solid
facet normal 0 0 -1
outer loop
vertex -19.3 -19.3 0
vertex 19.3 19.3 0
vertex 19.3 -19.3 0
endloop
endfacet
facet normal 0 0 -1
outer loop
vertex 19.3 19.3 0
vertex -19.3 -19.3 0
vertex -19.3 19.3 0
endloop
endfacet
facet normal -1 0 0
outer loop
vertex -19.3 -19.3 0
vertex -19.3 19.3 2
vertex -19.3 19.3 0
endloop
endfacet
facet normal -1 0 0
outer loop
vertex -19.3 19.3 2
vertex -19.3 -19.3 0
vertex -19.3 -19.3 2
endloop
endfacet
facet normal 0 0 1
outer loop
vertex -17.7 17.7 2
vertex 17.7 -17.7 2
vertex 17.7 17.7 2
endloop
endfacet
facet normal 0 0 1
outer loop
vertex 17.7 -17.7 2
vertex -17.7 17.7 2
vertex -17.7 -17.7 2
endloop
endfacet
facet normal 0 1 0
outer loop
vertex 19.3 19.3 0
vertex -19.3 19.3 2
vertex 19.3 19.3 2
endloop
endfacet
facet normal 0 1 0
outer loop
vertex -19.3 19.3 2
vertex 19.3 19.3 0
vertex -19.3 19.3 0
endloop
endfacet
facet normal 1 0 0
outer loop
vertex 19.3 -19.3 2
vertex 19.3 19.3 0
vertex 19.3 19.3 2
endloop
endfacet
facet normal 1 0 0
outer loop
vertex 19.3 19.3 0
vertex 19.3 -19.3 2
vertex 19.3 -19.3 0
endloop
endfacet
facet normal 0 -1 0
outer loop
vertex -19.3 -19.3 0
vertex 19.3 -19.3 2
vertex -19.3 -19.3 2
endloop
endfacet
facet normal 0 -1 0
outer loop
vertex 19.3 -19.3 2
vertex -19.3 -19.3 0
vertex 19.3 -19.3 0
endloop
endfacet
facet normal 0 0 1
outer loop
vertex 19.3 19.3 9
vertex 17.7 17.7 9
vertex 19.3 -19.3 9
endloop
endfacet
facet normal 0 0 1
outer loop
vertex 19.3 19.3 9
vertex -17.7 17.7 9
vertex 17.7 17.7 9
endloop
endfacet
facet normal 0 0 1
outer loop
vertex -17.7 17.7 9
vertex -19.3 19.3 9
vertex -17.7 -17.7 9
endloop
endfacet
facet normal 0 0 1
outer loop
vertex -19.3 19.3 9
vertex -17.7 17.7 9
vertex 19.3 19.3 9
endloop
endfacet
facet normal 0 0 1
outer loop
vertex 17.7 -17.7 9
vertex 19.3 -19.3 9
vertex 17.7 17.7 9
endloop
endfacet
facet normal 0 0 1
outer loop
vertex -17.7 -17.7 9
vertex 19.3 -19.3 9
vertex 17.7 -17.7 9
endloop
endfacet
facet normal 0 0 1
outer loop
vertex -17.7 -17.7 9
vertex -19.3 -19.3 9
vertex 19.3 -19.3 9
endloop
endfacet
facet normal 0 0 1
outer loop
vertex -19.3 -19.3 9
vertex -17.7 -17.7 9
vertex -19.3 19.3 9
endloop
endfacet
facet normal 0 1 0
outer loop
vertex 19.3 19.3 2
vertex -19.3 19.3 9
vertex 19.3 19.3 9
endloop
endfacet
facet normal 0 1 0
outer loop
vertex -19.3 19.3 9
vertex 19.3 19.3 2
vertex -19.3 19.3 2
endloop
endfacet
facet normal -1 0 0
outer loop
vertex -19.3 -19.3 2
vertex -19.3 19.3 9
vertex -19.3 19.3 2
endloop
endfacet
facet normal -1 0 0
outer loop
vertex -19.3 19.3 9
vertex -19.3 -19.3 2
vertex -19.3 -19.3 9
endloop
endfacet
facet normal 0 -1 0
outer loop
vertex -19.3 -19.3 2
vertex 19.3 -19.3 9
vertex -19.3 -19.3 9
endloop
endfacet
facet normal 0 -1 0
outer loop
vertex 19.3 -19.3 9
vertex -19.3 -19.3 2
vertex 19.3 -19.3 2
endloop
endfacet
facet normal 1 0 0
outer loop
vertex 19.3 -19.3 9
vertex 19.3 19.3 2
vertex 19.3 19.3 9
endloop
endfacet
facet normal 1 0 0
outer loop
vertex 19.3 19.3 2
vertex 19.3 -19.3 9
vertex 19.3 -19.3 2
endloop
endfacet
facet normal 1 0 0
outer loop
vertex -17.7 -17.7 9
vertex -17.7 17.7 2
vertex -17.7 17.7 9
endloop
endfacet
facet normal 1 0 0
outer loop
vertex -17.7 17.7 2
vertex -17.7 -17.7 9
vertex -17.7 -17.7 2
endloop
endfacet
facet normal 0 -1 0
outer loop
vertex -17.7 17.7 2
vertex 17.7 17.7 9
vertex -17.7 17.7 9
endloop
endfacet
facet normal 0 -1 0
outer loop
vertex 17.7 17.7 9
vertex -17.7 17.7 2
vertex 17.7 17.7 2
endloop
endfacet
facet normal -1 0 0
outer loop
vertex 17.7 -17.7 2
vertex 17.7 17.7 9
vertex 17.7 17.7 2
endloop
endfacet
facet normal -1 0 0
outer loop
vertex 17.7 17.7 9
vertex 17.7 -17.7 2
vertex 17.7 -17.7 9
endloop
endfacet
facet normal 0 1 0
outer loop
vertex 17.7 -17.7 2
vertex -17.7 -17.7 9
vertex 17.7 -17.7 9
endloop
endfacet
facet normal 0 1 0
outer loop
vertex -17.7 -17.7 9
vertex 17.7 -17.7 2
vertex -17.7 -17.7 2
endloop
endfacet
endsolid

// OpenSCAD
// file: ../diffuser.scad
// Swappable diffuser panel. Thickness is the STL knob; the diffusing structure
// (gyroid/grid, density, top/bottom solid layers = 0) is set in the slicer.

module diffuser_panel(t) {
    linear_extrude(t) square([panel_side, panel_side], center = true);
}

// Slide-over diffuser CAP: a diffuser top + a skirt that slides over the OUTSIDE
// of a chimney. Easy on/off, and one cap fits any chimney (same outer size).
// Modeled diffuser-face-down (z=0..t) = print orientation (smooth side on bed);
// flip it in use so the smooth face points at the viewer and the skirt hangs down.
module diffuser_cap(t) {
    si = cell_pitch + cap_fit_clear;      // skirt inner — slides over the chimney outer
    so = si + 2 * cap_skirt_t;            // skirt outer
    union() {
        linear_extrude(t) square([so, so], center = true);          // diffuser face
        translate([0, 0, t])
            linear_extrude(cap_skirt_h)                             // skirt
                difference() {
                    square([so, so], center = true);
                    square([si, si], center = true);
                }
    }
}
// file: ../config.scad
// ===== CHARGE LED sign — global config =====
// Edit this file; then run ./build.sh to regenerate every STL.

$fn = 72;

// ---- calibrated collar (press-fit for 12mm bullet pixel) ----
collar_stl    = "../../assets/bullet-collar.stl"; // path resolved from src/parts/ entry files
collar_h      = 2.0;     // Z span of the collar STL
collar_od     = 16.0;    // collar outer diameter
collar_cx     = 43.0;    // STL native X center (Y center is 0)
pixel_through = 12.3;    // clearance hole through the plate (just over bore Ø12.19)
dome_clear    = 4.0;     // dome protrusion above plate front. Spec: 5.5mm dome-tip-to-flange,
                         // flange seats on plate back, minus 2mm plate ~= 3.5-4mm. Seat a real
                         // pixel and measure to lock it in.

// ---- shell ----
plate_t    = 2.0;        // rear plate thickness (== collar_h, so the collar sits flush)
wall_t     = 2.5;        // chimney wall thickness
cell_inner = 30;         // square interior of each test cell (the press-fit opening)

// ---- diffuser panels (flat, drop-in — kept for the final glued option) ----
panel_press_clear = 0.25; // panel is this much SMALLER than the opening (total) -> friction fit
panel_thicks      = [1, 2, 3];

// ---- diffuser CAP (slides over the chimney; easy-swap for testing) ----
cap_fit_clear = 0.4;   // skirt-inner minus chimney-outer (total); bigger = looser slide
cap_skirt_t   = 1.6;   // skirt wall thickness
cap_skirt_h   = 7;     // how far the skirt grips down over the chimney

// ---- coupon depth ladder ----
led_gaps = [20, 35, 50]; // clear LED-tip -> panel distance, per cell (mm)

// ---- collar v2: original bore + lip, plus a 45-deg lead-in chamfer ----
bore_face_r   = 6.10;    // collar bore radius at each face (~Ø12.2)
chamfer_depth = 0.5;     // axial depth of the 45-deg lead-in at each face
mouth_r       = bore_face_r + chamfer_depth;  // chamfer mouth radius (~Ø13.2)

// ---- collar A/B test harness ----
harness_w     = 52;      // tile width
harness_d     = 30;      // tile depth
harness_t     = plate_t; // match the real wall thickness for a faithful fit test
harness_pitch = 24;      // spacing between the two hole centers

// ---- derived ----
cell_pitch = cell_inner + 2 * wall_t;      // outer cell footprint (35)
n_cells    = len(led_gaps);
plate_w    = n_cells * cell_pitch;
plate_d    = cell_pitch;
panel_side = cell_inner - panel_press_clear;
function cell_x(i)     = i * cell_pitch + cell_pitch / 2;
function chimney_H(i)  = plate_t + dome_clear + led_gaps[i];
// main file
// Build target: 2mm slide-over diffuser cap.
include <../config.scad>
include <../diffuser.scad>
diffuser_cap(2);
